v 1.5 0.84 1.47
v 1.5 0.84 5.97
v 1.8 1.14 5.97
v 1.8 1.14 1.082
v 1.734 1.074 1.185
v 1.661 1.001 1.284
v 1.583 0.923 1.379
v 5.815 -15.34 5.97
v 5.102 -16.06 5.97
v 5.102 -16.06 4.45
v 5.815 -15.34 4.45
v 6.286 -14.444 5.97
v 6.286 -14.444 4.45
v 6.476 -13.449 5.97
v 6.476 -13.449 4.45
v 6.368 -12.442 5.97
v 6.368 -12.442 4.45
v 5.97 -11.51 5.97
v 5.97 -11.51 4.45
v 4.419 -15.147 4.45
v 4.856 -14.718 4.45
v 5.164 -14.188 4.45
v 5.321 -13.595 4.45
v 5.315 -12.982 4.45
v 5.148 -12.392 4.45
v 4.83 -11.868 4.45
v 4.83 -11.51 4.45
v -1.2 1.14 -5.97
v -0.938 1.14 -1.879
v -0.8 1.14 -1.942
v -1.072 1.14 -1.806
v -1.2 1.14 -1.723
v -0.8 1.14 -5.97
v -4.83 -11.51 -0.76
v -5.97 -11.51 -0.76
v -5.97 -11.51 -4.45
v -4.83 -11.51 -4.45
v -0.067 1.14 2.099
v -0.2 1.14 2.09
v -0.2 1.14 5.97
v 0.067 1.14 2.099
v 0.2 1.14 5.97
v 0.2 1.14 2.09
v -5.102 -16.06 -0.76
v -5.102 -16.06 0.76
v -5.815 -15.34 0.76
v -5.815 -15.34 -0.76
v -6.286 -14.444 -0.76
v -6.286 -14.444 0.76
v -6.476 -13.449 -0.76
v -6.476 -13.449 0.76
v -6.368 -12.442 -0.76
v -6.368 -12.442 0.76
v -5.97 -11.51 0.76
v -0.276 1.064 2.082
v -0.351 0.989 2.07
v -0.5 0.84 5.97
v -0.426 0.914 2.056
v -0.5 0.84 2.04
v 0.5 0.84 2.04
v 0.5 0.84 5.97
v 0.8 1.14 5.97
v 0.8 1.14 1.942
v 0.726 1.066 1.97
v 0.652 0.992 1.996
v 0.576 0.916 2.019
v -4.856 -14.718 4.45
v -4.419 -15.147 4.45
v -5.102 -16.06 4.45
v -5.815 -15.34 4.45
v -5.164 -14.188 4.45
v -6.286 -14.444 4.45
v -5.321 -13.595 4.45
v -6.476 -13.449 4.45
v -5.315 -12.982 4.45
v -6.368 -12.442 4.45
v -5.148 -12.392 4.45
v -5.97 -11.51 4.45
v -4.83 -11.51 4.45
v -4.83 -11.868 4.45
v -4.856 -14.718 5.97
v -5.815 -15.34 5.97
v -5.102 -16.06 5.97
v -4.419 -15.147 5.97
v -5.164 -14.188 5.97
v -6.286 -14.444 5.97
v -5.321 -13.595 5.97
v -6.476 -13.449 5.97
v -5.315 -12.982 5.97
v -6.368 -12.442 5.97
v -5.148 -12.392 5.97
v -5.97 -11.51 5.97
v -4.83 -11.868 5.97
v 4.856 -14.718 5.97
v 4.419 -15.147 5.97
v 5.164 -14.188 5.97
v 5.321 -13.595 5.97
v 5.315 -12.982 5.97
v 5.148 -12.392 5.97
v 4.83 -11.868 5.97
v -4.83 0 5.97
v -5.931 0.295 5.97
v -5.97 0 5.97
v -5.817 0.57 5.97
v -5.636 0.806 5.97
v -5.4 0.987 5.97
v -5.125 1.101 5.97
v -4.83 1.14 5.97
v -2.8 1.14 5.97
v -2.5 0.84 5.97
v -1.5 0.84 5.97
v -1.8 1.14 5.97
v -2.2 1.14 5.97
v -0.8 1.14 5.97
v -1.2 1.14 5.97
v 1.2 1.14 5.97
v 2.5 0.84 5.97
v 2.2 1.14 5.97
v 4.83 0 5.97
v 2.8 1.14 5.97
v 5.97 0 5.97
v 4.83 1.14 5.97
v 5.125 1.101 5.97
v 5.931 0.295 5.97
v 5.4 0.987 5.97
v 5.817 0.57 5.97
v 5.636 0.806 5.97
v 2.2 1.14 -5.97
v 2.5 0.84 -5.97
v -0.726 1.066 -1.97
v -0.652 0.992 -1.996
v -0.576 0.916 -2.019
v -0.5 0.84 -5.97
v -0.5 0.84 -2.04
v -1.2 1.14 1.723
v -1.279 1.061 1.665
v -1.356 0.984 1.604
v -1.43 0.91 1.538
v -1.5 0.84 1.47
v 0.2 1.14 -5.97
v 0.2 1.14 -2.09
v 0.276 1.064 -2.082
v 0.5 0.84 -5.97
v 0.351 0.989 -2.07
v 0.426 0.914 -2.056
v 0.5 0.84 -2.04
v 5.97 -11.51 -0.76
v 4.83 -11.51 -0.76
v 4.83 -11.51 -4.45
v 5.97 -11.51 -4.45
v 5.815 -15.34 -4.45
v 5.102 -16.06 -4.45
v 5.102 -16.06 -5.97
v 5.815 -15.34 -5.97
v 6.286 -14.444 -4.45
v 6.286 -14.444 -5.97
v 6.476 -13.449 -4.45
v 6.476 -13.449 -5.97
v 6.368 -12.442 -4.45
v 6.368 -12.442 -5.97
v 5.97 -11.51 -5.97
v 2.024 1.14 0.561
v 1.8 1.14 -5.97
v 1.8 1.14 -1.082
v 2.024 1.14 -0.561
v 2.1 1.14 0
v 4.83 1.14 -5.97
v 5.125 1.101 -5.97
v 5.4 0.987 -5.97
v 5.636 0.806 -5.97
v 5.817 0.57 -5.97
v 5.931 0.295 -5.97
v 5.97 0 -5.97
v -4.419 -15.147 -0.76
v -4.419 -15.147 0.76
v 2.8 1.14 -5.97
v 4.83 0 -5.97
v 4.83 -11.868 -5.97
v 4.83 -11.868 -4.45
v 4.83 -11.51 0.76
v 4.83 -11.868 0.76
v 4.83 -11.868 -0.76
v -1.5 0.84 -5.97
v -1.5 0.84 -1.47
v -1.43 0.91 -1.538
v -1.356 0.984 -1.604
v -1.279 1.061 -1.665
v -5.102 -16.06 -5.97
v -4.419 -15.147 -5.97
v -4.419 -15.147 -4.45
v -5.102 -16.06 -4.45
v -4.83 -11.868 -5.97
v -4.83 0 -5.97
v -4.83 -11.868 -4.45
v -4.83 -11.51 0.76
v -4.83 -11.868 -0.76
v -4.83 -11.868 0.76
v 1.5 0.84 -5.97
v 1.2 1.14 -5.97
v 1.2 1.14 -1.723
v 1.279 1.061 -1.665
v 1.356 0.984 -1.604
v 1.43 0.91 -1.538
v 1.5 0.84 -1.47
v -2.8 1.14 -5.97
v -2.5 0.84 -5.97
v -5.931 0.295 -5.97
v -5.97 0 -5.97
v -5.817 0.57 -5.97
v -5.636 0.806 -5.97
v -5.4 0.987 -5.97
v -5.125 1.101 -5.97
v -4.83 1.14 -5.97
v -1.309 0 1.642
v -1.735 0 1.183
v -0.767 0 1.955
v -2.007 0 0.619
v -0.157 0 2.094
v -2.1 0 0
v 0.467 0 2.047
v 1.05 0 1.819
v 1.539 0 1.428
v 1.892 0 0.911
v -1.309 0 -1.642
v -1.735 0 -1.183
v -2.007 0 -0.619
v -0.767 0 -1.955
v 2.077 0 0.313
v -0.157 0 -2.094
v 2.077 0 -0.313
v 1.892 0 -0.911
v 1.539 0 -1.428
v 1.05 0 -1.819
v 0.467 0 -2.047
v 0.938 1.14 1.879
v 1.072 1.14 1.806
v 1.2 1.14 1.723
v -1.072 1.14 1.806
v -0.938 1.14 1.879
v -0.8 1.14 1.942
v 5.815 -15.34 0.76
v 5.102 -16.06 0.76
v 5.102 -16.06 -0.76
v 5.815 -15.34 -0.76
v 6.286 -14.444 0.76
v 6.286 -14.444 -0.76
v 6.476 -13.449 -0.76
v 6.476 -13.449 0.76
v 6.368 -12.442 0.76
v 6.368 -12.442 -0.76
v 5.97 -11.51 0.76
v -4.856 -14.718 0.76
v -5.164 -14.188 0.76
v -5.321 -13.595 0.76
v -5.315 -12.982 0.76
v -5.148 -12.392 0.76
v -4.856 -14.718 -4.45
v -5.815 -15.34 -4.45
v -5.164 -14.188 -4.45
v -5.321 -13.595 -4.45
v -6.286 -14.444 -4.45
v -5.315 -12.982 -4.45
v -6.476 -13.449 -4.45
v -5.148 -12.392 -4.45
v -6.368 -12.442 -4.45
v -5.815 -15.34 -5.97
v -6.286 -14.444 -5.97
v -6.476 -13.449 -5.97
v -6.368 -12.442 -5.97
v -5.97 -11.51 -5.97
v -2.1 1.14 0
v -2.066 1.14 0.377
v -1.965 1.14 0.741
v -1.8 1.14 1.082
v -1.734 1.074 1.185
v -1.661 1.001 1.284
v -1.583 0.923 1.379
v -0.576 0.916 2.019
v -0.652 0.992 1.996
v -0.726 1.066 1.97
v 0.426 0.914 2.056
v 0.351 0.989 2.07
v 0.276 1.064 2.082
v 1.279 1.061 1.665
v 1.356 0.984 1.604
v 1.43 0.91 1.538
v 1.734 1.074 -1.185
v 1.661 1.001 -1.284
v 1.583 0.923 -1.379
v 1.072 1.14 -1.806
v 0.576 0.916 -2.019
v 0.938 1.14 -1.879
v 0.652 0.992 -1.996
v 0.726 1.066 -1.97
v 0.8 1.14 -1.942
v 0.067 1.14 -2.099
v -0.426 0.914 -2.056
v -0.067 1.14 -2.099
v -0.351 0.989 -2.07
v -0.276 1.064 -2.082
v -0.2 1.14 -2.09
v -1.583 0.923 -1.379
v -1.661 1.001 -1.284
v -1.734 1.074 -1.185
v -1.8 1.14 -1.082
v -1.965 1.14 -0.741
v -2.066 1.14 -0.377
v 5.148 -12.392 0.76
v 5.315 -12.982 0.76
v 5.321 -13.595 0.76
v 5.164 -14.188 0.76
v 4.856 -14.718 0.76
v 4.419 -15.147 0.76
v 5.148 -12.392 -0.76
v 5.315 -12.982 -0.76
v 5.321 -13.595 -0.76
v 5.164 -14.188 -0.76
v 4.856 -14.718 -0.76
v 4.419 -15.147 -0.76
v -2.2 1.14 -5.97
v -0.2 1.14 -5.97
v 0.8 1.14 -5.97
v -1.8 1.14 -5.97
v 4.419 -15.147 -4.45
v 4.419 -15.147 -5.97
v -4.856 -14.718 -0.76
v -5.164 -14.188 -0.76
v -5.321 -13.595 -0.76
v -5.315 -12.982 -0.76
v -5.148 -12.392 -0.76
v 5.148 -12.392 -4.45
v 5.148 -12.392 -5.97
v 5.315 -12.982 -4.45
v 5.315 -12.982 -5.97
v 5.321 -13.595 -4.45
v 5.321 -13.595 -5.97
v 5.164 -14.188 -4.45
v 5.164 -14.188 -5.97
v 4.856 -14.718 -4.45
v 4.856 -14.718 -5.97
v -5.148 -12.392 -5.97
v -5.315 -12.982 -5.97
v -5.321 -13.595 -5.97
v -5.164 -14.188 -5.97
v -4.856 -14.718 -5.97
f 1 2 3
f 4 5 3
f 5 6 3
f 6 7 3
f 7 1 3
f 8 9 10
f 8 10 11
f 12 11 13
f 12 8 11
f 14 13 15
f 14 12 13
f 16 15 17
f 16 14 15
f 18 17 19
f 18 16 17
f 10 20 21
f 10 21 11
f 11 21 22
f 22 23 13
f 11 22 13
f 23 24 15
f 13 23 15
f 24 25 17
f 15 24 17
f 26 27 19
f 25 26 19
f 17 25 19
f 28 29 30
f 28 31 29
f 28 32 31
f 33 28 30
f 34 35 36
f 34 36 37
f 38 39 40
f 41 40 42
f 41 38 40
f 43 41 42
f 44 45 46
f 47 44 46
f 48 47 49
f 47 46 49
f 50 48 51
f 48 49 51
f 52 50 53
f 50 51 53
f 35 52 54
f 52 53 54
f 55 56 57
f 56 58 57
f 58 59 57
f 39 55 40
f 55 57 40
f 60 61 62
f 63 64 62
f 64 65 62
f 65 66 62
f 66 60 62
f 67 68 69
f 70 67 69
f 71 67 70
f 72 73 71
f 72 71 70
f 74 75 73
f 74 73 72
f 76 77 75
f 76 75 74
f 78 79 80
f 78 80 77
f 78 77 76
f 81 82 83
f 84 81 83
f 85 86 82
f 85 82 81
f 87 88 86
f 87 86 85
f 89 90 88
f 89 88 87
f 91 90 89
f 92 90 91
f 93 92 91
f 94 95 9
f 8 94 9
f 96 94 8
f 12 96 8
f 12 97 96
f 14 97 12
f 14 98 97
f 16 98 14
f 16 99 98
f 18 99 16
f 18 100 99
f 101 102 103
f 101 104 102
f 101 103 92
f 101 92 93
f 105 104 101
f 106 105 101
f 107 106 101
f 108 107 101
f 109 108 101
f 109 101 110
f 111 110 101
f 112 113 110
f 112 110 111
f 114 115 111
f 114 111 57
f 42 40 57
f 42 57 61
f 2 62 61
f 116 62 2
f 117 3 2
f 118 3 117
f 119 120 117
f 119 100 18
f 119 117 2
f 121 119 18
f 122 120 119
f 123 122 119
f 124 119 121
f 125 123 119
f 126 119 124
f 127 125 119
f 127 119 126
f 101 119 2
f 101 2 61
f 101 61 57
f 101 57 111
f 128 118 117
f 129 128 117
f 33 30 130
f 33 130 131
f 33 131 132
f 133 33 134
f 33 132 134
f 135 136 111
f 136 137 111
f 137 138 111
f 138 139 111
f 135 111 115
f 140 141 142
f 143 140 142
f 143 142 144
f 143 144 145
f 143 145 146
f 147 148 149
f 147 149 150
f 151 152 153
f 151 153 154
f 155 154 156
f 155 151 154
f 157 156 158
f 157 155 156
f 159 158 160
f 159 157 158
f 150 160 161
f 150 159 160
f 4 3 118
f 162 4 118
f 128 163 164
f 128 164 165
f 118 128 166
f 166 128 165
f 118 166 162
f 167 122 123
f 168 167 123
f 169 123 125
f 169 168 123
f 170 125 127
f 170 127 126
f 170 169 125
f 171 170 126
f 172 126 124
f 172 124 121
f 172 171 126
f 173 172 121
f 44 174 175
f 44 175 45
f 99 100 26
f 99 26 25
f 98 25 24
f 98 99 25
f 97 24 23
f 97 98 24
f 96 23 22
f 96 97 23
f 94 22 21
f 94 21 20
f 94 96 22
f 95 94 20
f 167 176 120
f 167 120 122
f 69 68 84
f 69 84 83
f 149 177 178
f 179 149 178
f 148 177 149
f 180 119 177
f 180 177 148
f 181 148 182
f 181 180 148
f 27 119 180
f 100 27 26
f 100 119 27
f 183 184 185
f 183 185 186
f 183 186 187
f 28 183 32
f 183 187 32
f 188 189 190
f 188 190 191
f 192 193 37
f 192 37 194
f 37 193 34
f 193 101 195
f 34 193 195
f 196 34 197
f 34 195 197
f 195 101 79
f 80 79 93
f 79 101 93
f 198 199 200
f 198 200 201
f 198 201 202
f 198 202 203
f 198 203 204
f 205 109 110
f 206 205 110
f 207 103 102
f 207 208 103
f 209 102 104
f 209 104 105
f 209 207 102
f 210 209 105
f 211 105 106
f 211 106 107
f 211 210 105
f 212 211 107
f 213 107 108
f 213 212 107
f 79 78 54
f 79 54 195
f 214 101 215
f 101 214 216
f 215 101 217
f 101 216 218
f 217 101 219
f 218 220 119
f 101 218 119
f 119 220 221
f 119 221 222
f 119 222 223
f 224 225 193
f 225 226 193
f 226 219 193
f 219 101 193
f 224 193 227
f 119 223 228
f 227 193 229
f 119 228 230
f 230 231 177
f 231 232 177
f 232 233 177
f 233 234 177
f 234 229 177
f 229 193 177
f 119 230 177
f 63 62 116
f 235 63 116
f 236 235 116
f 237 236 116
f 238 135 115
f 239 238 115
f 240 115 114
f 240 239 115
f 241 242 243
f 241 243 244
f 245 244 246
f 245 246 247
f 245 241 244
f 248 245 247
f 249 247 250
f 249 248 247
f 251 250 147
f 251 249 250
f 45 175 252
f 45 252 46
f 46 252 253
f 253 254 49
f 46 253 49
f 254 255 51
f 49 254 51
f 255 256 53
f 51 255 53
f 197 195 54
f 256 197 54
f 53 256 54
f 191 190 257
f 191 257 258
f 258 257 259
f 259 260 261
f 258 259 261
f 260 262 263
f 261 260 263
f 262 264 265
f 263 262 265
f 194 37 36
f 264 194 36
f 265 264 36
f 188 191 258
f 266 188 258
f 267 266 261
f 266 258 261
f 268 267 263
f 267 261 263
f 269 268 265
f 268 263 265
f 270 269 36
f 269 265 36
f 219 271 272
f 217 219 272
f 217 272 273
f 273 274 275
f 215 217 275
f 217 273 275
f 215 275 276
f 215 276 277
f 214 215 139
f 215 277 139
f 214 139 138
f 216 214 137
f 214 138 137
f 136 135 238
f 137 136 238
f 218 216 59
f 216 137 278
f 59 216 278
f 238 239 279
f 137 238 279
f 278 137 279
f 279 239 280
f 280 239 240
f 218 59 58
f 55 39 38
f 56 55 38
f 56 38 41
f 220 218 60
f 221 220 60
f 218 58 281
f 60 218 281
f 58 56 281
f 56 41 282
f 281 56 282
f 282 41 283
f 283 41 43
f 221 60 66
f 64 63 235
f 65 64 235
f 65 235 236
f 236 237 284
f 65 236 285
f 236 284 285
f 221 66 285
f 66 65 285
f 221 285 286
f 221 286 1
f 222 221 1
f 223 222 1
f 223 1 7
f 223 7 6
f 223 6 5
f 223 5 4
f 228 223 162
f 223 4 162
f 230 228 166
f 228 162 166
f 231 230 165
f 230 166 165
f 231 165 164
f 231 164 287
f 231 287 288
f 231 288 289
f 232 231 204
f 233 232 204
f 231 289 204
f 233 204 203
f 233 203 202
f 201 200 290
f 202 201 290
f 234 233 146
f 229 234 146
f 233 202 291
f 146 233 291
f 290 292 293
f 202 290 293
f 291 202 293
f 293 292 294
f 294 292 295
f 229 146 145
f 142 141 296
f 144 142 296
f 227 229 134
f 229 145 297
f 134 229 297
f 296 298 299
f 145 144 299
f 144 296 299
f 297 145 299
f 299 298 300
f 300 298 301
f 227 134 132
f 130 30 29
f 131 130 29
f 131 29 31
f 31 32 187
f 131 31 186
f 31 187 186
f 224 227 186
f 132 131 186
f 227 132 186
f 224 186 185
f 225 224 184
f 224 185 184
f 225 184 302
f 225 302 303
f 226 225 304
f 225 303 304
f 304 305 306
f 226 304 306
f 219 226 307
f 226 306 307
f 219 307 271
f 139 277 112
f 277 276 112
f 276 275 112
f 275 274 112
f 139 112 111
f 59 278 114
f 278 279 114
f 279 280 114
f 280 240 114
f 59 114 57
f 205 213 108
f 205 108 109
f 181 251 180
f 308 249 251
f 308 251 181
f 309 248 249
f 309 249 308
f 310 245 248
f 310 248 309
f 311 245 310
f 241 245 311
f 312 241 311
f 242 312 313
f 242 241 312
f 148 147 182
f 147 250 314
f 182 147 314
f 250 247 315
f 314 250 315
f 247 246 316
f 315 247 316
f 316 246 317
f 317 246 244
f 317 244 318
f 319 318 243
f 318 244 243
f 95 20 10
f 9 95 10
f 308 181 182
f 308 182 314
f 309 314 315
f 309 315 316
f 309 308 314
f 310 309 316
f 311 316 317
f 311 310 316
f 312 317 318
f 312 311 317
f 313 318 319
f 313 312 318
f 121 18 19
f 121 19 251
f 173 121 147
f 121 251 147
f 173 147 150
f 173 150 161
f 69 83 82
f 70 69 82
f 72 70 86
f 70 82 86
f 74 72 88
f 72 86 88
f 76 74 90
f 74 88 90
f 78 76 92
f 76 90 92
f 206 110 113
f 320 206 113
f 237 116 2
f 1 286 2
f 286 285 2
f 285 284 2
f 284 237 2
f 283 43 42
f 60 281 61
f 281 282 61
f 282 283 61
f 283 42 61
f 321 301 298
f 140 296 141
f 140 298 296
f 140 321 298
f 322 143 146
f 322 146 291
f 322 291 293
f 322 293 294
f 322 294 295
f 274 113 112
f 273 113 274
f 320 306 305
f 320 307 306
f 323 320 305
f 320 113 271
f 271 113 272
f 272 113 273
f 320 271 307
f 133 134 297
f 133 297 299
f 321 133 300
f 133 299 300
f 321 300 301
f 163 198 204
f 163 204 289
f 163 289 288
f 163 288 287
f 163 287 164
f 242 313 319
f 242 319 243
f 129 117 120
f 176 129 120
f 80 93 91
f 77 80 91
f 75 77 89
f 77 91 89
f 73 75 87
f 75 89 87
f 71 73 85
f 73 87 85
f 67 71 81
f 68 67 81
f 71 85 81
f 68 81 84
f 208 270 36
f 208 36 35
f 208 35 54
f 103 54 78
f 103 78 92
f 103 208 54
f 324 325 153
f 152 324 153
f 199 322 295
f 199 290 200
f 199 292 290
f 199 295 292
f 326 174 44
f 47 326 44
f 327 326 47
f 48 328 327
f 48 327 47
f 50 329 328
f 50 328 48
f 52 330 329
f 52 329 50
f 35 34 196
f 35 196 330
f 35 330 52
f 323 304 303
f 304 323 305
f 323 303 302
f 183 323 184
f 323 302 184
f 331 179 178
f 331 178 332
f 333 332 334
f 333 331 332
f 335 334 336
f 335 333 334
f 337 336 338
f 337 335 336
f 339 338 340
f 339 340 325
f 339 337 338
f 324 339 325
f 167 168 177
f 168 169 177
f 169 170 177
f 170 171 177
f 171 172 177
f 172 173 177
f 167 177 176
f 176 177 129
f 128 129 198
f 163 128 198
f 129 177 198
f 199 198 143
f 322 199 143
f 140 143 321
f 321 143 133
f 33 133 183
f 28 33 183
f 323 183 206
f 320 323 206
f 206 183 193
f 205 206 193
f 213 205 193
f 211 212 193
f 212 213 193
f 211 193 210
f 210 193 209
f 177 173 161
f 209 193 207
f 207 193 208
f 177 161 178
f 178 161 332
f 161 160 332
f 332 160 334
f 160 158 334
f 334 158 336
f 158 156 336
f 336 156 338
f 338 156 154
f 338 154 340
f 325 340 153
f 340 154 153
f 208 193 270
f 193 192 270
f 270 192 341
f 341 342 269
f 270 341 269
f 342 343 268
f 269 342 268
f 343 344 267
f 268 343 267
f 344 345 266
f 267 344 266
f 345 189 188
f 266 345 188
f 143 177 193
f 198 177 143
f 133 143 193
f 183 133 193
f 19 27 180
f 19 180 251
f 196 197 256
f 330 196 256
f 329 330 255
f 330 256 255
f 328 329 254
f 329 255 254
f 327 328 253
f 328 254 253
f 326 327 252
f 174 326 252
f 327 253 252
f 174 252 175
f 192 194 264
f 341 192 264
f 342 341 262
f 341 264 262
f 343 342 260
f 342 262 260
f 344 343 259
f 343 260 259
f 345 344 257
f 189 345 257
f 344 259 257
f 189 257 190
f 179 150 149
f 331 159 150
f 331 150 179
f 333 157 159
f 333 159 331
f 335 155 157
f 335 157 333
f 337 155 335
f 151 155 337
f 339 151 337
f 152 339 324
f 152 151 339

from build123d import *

# Parameters (mm, degrees)
SKETCH1_W             = 11.94
SKETCH1_H             = 11.94
BOSS_EXTRUDE1_DEPTH   = 1.14
CUT_EXTRUDE2_DEPTH    = 12.94
LPATTERN1_COUNT       = 2
LPATTERN1_PITCH       = 2
LPATTERN1_COL_COUNT   = 2
LPATTERN1_COL_PITCH   = 2
SKETCH7_W             = 1.14
SKETCH7_H             = 11.94
BOSS_EXTRUDE2_DEPTH   = 11.51
BOSS_EXTRUDE3_DEPTH   = 1.52
LPATTERN3_COUNT       = 3
LPATTERN3_PITCH       = 5.21
MIRROR1_COPY_1_DEPTH  = 1.52
MIRROR1_COPY_2_DEPTH  = 1.52
FILLET2_R             = 1.14
M5X0_8_TAPPED_HOLE2_D = 4.2


with BuildPart() as part:
    # Sketch1 → Boss-Extrude1 (new body)
    with BuildSketch(Plane(origin=(0, 0, 0), x_dir=(1, 0, 0), z_dir=(0, 1, 0))):
        Rectangle(SKETCH1_W, SKETCH1_H)
    extrude(amount=BOSS_EXTRUDE1_DEPTH)

    # Sketch4 → Cut-Extrude2 (cut, through all)
    with BuildSketch(Plane.XY.offset(5.97)):
        Polygon((0.2, 1.14), (0.5, 0.84), (0.8, 1.14), align=None)
        Polygon((-0.5, 0.84), (-0.2, 1.14), (-0.8, 1.14), align=None)
    cut_extrude2 = extrude(amount=-CUT_EXTRUDE2_DEPTH, mode=Mode.SUBTRACT)

    # LPattern1: Cut-Extrude2 ×2
    with Locations(*[(i * LPATTERN1_PITCH, 0, 0) for i in range(1, LPATTERN1_COUNT)]):
        add(cut_extrude2, mode=Mode.SUBTRACT)

    # LPattern1 col: Cut-Extrude2 ×2
    with Locations(*[(-i * LPATTERN1_COL_PITCH, 0, 0) for i in range(1, LPATTERN1_COL_COUNT)]):
        add(cut_extrude2, mode=Mode.SUBTRACT)

    # Sketch7 → Boss-Extrude2 (add)
    with BuildSketch(Plane.XZ):
        with Locations((-5.4, 0)):
            Rectangle(SKETCH7_W, SKETCH7_H)
        with Locations((5.4, 0)):
            Rectangle(SKETCH7_W, SKETCH7_H)
    extrude(amount=BOSS_EXTRUDE2_DEPTH)

    # Sketch6 → Boss-Extrude3 (add)
    with BuildSketch(Plane.XY.offset(5.97)):
        with BuildLine():
            Line((-4.83, -11.51), (-4.83, -11.86806677))
            ThreePointArc((-4.83, -11.86806677), (-5.321138867, -13.595029247), (-4.418877615, -15.14729901))
            Line((-4.418877615, -15.14729901), (-5.101941963, -16.06))
            ThreePointArc((-5.101941963, -16.06), (-6.41810343, -13.95329498), (-5.97, -11.51))
            Line((-5.97, -11.51), (-4.83, -11.51))
        make_face()
    boss_extrude3 = extrude(amount=-BOSS_EXTRUDE3_DEPTH)

    # LPattern3: Boss-Extrude3 ×3
    with Locations(*[(0, 0, -i * LPATTERN3_PITCH) for i in range(1, LPATTERN3_COUNT)]):
        add(boss_extrude3)

    # Mirror1: Boss-Extrude3 across plane
    add(boss_extrude3.mirror(Plane(origin=(0, 0, 0), x_dir=(0, 0, 1), z_dir=(1, 0, 0))))

    # Mirror1 copy 1 sketch → Mirror1 copy 1 (add)
    with BuildSketch(Plane(origin=(0, 0, 0.76), x_dir=(-1, 0, 0), z_dir=(0, 0, 1))):
        with BuildLine():
            Line((-4.83, 11.51), (-4.83, 11.86806677))
            ThreePointArc((-4.83, 11.86806677), (-5.321138867, 13.595029247), (-4.418877615, 15.14729901))
            Line((-4.418877615, 15.14729901), (-5.101941963, 16.06))
            ThreePointArc((-5.101941963, 16.06), (-6.41810343, 13.95329498), (-5.97, 11.51))
            Line((-5.97, 11.51), (-4.83, 11.51))
        make_face()
    extrude(amount=-MIRROR1_COPY_1_DEPTH)

    # Mirror1 copy 2 sketch → Mirror1 copy 2 (add)
    with BuildSketch(Plane(origin=(0, 0, -4.45), x_dir=(-1, 0, 0), z_dir=(0, 0, 1))):
        with BuildLine():
            Line((-4.83, 11.51), (-4.83, 11.86806677))
            ThreePointArc((-4.83, 11.86806677), (-5.321138867, 13.595029247), (-4.418877615, 15.14729901))
            Line((-4.418877615, 15.14729901), (-5.101941963, 16.06))
            ThreePointArc((-5.101941963, 16.06), (-6.41810343, 13.95329498), (-5.97, 11.51))
            Line((-5.97, 11.51), (-4.83, 11.51))
        make_face()
    extrude(amount=-MIRROR1_COPY_2_DEPTH)

    # Fillet2
    fillet2_edges = [part.edges().sort_by_distance(p)[0] for p in [
        (5.97, 1.14, 0),
        (-5.97, 1.14, 0),
    ]]
    fillet(fillet2_edges, radius=FILLET2_R)

    # M5x0.8 Tapped Hole2 (through all)
    with Locations(Plane.XZ):
        with Locations((0, 0)):
            Hole(M5X0_8_TAPPED_HOLE2_D / 2)


solid = part.part
